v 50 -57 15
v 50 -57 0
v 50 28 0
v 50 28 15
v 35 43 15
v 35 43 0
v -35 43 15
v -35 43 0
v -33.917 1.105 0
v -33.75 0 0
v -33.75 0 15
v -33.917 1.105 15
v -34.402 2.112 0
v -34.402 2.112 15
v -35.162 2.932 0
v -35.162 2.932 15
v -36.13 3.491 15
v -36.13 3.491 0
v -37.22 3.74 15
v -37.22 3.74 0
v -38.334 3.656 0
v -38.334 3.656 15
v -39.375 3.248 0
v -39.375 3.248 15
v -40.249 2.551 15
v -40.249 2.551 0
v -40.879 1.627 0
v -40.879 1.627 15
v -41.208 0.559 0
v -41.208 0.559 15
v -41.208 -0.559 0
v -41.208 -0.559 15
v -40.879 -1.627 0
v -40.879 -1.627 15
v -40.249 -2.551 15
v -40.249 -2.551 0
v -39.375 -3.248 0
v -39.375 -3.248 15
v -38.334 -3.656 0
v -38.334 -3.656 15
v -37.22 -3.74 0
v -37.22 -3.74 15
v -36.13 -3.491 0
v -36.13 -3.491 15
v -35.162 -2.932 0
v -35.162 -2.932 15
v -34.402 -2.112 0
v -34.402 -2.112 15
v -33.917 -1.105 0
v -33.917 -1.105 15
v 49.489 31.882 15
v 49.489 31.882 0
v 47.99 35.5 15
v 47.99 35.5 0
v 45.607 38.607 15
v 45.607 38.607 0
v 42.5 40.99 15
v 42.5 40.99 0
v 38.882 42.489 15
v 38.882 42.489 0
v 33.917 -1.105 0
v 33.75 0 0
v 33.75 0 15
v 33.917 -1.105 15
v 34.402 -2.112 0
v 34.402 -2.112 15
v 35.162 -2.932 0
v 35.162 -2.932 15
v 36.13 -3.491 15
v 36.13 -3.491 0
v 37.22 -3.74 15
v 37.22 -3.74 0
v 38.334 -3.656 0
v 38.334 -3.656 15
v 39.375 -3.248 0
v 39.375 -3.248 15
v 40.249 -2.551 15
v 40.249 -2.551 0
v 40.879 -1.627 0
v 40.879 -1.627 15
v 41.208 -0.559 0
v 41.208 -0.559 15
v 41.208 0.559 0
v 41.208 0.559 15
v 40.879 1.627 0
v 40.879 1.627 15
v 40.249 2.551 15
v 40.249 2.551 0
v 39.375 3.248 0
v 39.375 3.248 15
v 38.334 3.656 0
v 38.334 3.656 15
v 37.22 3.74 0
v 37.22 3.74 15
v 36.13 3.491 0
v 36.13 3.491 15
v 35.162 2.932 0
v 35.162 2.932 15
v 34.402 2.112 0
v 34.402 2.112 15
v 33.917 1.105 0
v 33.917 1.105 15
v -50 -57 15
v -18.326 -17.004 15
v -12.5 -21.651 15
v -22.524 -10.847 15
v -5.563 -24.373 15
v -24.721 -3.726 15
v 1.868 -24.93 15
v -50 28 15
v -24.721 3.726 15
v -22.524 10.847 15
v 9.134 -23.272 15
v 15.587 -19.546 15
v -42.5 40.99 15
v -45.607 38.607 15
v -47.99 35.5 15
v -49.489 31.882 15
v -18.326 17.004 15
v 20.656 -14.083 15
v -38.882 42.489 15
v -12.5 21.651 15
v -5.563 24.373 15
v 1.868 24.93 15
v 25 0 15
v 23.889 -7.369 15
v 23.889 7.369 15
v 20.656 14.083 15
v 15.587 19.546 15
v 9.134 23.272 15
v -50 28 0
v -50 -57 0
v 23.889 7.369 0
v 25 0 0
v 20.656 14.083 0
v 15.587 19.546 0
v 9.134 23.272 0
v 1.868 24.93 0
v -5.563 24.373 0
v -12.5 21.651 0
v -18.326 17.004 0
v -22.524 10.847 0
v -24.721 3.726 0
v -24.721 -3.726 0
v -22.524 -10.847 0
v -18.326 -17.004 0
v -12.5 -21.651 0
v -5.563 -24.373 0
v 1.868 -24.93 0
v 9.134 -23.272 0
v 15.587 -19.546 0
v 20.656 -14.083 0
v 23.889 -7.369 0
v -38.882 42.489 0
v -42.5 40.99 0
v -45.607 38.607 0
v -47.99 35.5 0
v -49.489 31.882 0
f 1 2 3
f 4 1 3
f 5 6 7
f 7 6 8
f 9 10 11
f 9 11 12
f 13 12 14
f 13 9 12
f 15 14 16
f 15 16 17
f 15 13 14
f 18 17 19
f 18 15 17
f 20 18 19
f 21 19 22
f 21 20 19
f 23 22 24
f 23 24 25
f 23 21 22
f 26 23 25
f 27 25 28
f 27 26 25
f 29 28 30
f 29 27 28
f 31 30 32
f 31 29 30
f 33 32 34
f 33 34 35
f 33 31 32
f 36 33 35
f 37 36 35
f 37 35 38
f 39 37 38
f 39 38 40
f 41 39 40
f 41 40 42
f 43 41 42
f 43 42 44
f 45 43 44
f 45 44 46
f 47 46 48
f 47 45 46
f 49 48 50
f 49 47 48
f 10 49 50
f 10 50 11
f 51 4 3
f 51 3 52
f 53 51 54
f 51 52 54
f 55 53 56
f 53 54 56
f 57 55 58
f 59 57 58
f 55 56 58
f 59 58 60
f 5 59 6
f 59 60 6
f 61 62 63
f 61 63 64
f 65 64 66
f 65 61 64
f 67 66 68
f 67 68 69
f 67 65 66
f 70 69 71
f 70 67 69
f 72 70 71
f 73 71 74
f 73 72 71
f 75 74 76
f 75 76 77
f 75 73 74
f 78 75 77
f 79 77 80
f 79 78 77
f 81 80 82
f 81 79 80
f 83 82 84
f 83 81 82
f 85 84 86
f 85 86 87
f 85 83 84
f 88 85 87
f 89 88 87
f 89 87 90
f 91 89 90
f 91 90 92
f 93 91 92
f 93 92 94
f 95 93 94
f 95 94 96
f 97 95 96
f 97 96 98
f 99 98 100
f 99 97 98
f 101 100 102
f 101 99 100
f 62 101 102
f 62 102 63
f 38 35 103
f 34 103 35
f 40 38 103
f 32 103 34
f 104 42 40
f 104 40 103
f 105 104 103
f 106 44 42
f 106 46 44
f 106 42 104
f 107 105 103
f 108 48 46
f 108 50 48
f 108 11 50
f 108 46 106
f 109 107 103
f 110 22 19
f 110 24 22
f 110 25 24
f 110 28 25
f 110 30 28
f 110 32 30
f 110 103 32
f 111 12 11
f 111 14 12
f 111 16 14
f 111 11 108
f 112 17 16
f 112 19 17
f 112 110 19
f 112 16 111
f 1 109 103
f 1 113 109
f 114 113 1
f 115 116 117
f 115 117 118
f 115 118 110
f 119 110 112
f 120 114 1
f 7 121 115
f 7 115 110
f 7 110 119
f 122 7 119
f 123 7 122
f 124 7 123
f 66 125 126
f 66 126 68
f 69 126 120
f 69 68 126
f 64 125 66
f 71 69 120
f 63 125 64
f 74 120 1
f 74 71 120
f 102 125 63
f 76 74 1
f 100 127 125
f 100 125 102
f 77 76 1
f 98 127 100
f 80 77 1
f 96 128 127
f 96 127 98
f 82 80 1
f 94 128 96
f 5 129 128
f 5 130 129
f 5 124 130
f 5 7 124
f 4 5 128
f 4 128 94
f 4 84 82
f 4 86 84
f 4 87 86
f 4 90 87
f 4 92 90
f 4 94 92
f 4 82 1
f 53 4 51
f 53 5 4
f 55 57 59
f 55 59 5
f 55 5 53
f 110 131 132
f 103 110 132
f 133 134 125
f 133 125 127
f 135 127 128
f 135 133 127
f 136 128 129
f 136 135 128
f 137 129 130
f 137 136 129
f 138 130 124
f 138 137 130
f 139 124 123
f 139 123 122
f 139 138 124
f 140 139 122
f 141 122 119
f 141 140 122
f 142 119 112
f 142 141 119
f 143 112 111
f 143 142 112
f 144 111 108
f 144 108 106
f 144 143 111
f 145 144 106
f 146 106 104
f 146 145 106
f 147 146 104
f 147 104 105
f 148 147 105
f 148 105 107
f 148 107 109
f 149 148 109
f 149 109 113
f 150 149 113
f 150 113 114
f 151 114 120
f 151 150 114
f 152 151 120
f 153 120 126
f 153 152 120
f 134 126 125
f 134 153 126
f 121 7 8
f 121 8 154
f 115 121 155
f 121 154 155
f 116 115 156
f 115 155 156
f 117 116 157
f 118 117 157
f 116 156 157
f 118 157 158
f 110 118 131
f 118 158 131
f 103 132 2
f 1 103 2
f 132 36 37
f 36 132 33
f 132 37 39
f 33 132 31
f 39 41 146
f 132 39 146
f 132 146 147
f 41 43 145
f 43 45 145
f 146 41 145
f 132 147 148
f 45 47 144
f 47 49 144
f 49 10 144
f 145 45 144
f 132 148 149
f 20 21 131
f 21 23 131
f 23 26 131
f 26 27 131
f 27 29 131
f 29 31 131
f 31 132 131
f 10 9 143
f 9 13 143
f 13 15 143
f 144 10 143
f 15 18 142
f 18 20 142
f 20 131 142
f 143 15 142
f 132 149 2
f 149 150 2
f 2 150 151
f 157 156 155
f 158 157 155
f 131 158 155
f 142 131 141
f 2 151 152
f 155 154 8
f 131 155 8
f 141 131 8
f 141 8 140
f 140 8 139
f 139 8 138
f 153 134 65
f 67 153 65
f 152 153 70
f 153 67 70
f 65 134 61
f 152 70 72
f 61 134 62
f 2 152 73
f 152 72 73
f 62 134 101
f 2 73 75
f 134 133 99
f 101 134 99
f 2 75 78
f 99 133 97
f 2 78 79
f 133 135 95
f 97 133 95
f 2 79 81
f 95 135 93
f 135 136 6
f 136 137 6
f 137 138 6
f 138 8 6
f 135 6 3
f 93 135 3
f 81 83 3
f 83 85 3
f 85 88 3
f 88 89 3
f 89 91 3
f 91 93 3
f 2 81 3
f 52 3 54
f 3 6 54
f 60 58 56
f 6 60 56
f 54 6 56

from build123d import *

# Parameters (mm, degrees)
SKETCH1_R           = 25
SKETCH1_R_2         = 3.75
BOSS_EXTRUDE1_DEPTH = 15


with BuildPart() as part:
    # Sketch1 → Boss-Extrude1 (new body)
    with BuildSketch(Plane.XY):
        with BuildLine():
            Line((-50, -57), (50, -57))
            Line((50, -57), (50, 28))
            ThreePointArc((50, 28), (45.606601718, 38.606601718), (35, 43))
            Line((35, 43), (-35, 43))
            ThreePointArc((-35, 43), (-45.606601718, 38.606601718), (-50, 28))
            Line((-50, 28), (-50, -57))
        make_face()
        Circle(SKETCH1_R, mode=Mode.SUBTRACT)
        with Locations((-37.5, 0)):
            Circle(SKETCH1_R_2, mode=Mode.SUBTRACT)
        with Locations(Location((37.5, 0, 0), (0, 0, 180))):
            Circle(SKETCH1_R_2, mode=Mode.SUBTRACT)
    extrude(amount=BOSS_EXTRUDE1_DEPTH)


solid = part.part
